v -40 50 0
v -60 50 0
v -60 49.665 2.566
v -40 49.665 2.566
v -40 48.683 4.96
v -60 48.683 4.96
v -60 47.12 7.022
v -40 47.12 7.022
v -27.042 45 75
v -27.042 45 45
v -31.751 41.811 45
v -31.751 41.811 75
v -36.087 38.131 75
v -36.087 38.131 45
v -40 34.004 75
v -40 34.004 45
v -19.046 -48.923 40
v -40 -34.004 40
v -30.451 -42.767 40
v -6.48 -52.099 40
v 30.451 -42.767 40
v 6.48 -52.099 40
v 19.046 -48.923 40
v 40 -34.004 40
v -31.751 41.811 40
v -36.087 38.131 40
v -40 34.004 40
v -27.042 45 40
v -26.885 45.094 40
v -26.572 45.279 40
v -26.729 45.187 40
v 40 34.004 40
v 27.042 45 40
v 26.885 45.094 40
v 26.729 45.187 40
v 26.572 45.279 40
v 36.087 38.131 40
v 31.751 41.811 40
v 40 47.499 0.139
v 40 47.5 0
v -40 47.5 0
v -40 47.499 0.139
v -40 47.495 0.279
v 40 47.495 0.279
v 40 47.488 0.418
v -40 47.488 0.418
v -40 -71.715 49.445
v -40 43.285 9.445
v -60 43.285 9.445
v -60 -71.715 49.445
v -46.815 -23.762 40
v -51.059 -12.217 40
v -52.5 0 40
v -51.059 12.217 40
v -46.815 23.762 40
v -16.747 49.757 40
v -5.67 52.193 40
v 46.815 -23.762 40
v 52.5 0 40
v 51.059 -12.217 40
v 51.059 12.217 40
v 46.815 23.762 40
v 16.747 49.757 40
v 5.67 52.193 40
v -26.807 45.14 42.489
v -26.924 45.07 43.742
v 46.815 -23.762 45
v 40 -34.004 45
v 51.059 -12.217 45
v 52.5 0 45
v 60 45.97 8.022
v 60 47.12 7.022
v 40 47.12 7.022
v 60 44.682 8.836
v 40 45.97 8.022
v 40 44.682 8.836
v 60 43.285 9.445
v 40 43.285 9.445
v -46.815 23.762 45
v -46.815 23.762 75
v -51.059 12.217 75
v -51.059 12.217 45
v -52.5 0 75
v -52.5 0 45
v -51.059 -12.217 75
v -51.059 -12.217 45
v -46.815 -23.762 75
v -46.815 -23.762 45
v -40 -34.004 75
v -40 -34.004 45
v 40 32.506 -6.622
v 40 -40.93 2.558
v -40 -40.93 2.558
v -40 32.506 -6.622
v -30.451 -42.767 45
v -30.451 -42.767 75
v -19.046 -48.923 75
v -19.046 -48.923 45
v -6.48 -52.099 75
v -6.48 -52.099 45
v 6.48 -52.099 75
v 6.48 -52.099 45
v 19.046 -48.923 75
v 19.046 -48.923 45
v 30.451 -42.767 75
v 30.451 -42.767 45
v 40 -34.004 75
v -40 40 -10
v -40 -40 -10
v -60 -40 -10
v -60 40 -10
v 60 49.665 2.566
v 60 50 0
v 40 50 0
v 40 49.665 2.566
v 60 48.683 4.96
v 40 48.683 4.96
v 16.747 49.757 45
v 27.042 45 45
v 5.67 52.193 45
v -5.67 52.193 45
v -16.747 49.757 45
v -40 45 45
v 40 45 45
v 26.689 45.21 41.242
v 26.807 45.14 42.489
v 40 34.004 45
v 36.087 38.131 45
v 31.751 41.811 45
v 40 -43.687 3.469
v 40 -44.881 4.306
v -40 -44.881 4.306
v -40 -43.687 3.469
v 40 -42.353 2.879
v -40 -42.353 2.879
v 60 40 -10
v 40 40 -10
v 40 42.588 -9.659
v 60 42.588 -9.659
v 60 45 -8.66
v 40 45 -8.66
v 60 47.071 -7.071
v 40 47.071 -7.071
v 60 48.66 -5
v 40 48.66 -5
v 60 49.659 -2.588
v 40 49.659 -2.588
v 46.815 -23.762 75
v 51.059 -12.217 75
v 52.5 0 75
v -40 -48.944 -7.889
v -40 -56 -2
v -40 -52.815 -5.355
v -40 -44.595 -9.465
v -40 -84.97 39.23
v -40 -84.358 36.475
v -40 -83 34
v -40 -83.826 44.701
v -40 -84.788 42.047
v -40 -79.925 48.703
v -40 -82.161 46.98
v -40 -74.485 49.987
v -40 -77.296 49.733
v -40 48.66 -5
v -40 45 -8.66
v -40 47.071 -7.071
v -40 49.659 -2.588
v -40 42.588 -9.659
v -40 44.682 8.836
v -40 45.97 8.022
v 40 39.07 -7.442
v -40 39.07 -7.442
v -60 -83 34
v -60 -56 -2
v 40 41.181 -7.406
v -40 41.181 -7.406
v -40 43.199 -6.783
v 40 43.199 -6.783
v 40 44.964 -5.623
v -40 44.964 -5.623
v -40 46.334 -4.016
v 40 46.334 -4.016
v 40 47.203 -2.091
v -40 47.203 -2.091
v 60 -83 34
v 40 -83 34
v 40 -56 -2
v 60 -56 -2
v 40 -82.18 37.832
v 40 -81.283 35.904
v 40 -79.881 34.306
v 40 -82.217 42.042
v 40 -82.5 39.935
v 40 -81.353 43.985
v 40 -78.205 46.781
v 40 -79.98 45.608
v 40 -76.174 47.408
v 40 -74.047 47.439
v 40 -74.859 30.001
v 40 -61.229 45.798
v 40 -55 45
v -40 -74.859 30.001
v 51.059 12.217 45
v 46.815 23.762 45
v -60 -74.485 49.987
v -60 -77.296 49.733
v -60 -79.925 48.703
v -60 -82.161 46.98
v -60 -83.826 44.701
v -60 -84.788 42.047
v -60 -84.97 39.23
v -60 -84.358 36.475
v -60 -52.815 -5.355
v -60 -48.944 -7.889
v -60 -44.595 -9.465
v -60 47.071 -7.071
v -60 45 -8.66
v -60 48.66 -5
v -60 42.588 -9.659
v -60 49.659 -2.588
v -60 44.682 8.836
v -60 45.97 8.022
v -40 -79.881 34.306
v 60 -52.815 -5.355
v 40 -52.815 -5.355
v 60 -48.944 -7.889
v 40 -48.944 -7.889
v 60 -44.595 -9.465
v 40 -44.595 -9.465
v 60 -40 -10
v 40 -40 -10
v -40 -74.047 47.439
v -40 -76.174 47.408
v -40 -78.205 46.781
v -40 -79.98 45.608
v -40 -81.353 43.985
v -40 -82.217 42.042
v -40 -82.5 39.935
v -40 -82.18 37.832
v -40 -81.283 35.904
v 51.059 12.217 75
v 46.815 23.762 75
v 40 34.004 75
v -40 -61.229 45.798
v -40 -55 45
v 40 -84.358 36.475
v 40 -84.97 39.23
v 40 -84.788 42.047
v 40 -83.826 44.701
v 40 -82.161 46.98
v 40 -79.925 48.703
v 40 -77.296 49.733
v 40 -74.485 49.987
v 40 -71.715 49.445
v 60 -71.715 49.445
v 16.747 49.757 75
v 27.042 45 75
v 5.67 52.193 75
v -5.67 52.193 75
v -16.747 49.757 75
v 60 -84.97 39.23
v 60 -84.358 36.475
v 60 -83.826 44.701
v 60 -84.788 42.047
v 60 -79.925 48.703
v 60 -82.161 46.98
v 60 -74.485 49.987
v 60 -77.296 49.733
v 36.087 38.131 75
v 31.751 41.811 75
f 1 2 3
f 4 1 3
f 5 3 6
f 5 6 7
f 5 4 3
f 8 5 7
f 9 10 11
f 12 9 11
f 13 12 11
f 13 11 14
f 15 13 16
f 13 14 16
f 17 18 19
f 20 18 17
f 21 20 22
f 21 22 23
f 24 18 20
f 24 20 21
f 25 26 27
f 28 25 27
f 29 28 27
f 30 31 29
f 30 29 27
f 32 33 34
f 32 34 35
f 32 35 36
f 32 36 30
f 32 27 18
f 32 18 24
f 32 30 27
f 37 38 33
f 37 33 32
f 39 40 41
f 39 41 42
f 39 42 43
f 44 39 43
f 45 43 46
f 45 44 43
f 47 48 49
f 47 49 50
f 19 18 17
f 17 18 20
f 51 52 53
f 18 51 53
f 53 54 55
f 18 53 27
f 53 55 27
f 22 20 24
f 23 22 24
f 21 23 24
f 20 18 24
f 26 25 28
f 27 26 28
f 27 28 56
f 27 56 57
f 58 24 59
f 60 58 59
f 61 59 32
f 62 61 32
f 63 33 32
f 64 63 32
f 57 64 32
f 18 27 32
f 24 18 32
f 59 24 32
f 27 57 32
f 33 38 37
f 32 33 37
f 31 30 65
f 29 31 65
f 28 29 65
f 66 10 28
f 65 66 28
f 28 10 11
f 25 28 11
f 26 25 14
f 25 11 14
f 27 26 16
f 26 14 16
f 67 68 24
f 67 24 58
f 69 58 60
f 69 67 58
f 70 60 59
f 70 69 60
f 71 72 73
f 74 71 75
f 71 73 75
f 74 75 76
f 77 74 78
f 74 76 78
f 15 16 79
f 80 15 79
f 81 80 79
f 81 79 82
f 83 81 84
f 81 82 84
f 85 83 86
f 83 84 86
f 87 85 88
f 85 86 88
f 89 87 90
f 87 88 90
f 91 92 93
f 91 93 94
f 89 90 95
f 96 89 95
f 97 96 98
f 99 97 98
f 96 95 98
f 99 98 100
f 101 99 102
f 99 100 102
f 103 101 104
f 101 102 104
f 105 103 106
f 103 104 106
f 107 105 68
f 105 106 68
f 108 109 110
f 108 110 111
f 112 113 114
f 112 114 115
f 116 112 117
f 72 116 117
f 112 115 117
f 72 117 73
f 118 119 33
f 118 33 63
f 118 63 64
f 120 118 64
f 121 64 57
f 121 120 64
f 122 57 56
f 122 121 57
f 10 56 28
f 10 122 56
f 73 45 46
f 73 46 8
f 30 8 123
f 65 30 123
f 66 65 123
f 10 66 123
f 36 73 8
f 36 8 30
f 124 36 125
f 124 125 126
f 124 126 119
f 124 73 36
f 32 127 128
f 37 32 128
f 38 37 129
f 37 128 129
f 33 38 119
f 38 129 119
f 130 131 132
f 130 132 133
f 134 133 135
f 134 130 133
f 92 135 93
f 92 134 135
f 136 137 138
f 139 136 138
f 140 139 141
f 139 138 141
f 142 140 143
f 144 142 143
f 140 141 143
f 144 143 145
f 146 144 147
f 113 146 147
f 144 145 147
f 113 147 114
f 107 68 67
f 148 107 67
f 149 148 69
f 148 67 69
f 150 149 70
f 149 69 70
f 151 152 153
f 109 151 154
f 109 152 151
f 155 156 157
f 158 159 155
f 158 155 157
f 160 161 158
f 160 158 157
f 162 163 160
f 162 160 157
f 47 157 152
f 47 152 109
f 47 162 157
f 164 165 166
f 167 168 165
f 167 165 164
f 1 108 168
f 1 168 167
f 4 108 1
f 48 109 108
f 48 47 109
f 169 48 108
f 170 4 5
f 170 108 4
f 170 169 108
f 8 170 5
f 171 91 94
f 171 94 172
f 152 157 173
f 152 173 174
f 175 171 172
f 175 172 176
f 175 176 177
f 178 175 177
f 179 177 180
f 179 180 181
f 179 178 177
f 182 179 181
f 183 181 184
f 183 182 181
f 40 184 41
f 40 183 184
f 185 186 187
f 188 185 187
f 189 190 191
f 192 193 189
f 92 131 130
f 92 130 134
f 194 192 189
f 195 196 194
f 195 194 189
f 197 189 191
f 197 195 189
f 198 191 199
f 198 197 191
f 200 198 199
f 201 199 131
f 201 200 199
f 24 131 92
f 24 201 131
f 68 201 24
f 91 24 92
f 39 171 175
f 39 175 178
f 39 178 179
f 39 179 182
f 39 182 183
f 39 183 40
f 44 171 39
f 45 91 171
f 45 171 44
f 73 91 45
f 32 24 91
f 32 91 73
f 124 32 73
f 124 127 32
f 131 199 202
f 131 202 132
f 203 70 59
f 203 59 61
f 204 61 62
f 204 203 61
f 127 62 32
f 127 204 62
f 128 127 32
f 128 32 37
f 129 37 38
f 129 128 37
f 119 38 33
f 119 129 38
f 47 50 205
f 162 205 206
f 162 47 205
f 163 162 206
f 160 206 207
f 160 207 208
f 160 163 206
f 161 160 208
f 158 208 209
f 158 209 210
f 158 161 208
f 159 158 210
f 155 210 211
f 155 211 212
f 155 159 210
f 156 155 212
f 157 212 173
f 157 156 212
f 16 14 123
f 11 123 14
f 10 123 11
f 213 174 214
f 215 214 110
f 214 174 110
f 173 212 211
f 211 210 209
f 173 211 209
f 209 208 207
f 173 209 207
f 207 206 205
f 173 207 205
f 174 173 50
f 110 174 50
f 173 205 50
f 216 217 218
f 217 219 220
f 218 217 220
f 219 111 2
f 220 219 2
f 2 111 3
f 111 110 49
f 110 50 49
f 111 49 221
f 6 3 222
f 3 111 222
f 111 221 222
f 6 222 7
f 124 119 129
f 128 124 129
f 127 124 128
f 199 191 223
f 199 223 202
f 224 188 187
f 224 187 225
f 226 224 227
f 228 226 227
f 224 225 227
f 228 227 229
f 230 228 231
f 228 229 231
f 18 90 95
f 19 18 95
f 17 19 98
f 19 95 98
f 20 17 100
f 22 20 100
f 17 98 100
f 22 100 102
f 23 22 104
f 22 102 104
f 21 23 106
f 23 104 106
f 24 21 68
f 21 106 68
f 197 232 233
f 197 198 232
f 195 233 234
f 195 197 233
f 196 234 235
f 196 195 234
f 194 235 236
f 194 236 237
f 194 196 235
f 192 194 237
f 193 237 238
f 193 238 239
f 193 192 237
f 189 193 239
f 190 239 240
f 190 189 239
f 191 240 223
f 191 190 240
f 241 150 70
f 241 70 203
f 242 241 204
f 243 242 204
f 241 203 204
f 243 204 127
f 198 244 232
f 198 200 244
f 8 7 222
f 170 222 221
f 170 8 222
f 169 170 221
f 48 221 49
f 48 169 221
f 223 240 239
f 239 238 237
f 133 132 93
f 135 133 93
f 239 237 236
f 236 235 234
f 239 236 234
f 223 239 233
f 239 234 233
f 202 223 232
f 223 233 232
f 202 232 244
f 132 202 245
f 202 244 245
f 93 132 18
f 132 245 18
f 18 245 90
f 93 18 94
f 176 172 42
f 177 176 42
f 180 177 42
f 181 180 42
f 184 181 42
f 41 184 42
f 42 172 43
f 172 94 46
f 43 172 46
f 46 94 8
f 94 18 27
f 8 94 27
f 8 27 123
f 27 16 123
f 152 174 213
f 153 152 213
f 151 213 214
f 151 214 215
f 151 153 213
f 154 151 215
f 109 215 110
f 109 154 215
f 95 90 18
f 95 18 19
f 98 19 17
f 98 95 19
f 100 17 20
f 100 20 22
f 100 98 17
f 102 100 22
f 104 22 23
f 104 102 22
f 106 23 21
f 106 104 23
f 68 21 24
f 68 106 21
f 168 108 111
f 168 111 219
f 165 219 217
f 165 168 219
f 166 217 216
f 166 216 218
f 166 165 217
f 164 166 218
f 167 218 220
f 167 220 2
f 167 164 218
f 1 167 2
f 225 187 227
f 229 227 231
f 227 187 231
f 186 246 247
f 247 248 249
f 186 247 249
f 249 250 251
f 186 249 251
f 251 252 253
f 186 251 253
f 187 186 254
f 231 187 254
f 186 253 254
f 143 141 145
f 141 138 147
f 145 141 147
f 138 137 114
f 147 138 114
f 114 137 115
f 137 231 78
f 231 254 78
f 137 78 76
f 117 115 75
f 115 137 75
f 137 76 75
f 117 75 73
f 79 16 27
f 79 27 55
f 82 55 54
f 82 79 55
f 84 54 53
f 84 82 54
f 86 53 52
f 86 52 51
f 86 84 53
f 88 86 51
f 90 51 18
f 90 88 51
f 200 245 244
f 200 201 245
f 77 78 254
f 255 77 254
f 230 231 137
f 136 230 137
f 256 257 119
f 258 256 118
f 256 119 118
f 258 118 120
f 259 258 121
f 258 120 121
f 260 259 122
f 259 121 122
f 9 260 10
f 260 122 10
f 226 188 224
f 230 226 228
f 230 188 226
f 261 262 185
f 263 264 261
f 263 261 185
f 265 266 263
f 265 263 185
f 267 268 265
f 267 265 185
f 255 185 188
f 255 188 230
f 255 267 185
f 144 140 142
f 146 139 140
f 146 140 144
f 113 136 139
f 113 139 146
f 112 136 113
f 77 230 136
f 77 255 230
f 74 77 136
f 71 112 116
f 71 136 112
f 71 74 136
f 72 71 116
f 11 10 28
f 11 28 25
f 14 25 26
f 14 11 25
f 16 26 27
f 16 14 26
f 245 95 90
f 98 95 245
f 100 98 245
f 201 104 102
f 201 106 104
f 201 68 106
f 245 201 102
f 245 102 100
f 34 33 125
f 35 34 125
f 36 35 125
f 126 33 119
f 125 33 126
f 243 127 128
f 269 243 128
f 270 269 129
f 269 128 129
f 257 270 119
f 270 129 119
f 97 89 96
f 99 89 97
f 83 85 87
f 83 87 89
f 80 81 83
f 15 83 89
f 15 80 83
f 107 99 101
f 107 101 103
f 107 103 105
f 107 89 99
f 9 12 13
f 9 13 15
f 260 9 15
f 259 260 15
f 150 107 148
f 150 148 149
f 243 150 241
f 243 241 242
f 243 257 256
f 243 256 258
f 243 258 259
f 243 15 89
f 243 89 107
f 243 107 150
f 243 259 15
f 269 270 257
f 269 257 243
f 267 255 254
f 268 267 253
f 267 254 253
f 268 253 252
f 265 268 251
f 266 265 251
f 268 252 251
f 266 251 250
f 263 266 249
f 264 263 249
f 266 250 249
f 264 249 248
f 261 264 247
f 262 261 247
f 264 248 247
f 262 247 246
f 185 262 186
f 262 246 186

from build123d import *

# Parameters (mm, degrees)
F1_DEPTH      = 40
F2_START      = 40
F2_DEPTH      = 20
F6_DEPTH      = 5
F7_DEPTH      = 30
F7_DEPTH_BACK = 5


with BuildPart() as f1:
    # F0 (on Right) → F1 (new body)
    with BuildSketch(Plane.YZ):
        with BuildLine():
            ThreePointArc((-67.5, 40), (-69.3699394637, 44.9550396928), (-74.047311562, 47.4392462481))
            ThreePointArc((-74.047311562, 47.4392462481), (-81.8542766067, 43.0444855394), (-79.8809353009, 34.3055754823))
            ThreePointArc((-79.8809353009, 34.3055754823), (-71.8660739285, 33.1861532613), (-67.5, 40))
        make_face()
        with BuildLine():
            Line((-22.5329362893, 0.2582503971), (32.5064382574, -6.6216714212))
            ThreePointArc((32.5064382574, -6.6216714212), (31.6956764696, 5.5711947285), (43.2852062494, 9.4449679671))
            Line((43.2852062494, 9.4449679671), (-61.2288449484, 45.7976814272))
            Line((-61.2288449484, 45.7976814272), (-67.4865130573, 46.5990540202))
            ThreePointArc((-67.4865130573, 46.5990540202), (-65.6422526902, 43.5259843004), (-65, 40))
            ThreePointArc((-65, 40), (-67.8792292984, 32.9789869239), (-74.8589249231, 30.0009951584))
            Line((-74.8589249231, 30.0009951584), (-58.9579294654, 16.3715704804))
            ThreePointArc((-58.9579294654, 16.3715704804), (-36.7718882692, 29.7377631624), (-20, 10))
            ThreePointArc((-20, 10), (-20.6435892504, 4.9671714819), (-22.5329362893, 0.2582503971))
        make_face()
        with BuildLine():
            ThreePointArc((-65, 40), (-65.6422526902, 43.5259843004), (-67.4865130573, 46.5990540202))
            Line((-67.4865130573, 46.5990540202), (-74.047311562, 47.4392462481))
            ThreePointArc((-74.047311562, 47.4392462481), (-69.3699394637, 44.9550396928), (-67.5, 40))
            ThreePointArc((-67.5, 40), (-71.8660739285, 33.1861532613), (-79.8809353009, 34.3055754823))
            Line((-79.8809353009, 34.3055754823), (-74.8589249231, 30.0009951584))
            ThreePointArc((-74.8589249231, 30.0009951584), (-67.8792292984, 32.9789869239), (-65, 40))
        make_face()
        with BuildLine():
            Line((-40.9302605094, 2.5579159246), (-22.5329362893, 0.2582503971))
            ThreePointArc((-22.5329362893, 0.2582503971), (-20.6435892504, 4.9671714819), (-20, 10))
            ThreePointArc((-20, 10), (-36.7718882692, 29.7377631624), (-58.9579294654, 16.3715704804))
            Line((-58.9579294654, 16.3715704804), (-44.8809353009, 4.3055754823))
            ThreePointArc((-44.8809353009, 4.3055754823), (-43.1339260715, 16.8138467387), (-32.5, 10))
            ThreePointArc((-32.5, 10), (-35.0364807757, 4.3774136814), (-40.9302605094, 2.5579159246))
        make_face()
        with BuildLine():
            ThreePointArc((-44.8809353009, 4.3055754823), (-43.0341518863, 3.1411427824), (-40.9302605094, 2.5579159246))
            ThreePointArc((-40.9302605094, 2.5579159246), (-35.0364807757, 4.3774136814), (-32.5, 10))
            ThreePointArc((-32.5, 10), (-43.1339260715, 16.8138467387), (-44.8809353009, 4.3055754823))
        make_face()
        with BuildLine():
            ThreePointArc((47.4883448123, 0.4179616875), (34.8816802289, 5.4820436628), (39.0697394906, -7.4420840754))
            ThreePointArc((39.0697394906, -7.4420840754), (44.9635192243, -5.6225863186), (47.5, 0))
            ThreePointArc((47.5, 0), (47.4970856368, 0.2090620815), (47.4883448123, 0.4179616875))
        make_face()
        with BuildLine():
            ThreePointArc((43.2852062494, 9.4449679671), (31.6956764696, 5.5711947285), (32.5064382574, -6.6216714212))
            Line((32.5064382574, -6.6216714212), (39.0697394906, -7.4420840754))
            ThreePointArc((39.0697394906, -7.4420840754), (34.8816802289, 5.4820436628), (47.4883448123, 0.4179616875))
            Line((47.4883448123, 0.4179616875), (47.1197372514, 7.0220610558))
            ThreePointArc((47.1197372514, 7.0220610558), (45.3416600218, 8.4537960829), (43.2852062494, 9.4449679671))
        make_face()
        with BuildLine():
            ThreePointArc((43.2852062494, 9.4449679671), (45.3416600218, 8.4537960829), (47.1197372514, 7.0220610558))
            Line((47.1197372514, 7.0220610558), (45, 45))
            Line((45, 45), (-55, 45))
            Line((-55, 45), (-61.2288449484, 45.7976814272))
            Line((-61.2288449484, 45.7976814272), (43.2852062494, 9.4449679671))
        make_face()
    extrude(amount=F1_DEPTH)

    # F4: F1 across plane


with BuildPart() as f2:
    # F0 (on Right) → F2 (new body)
    with BuildSketch(Plane.YZ.offset(F2_START)):
        with BuildLine():
            ThreePointArc((-71.7147937506, 49.4449679671), (-83.0742850398, 45.8996543201), (-83, 34))
            ThreePointArc((-83, 34), (-79.4089324294, 31.0244044859), (-74.8589249231, 30.0009951584))
            Line((-74.8589249231, 30.0009951584), (-79.8809353009, 34.3055754823))
            ThreePointArc((-79.8809353009, 34.3055754823), (-81.8542766067, 43.0444855394), (-74.047311562, 47.4392462481))
            Line((-74.047311562, 47.4392462481), (-67.4865130573, 46.5990540202))
            ThreePointArc((-67.4865130573, 46.5990540202), (-69.4162960131, 48.2959176579), (-71.7147937506, 49.4449679671))
        make_face()
        with BuildLine():
            Line((-67.4865130573, 46.5990540202), (-61.2288449484, 45.7976814272))
            Line((-61.2288449484, 45.7976814272), (-71.7147937506, 49.4449679671))
            ThreePointArc((-71.7147937506, 49.4449679671), (-69.4162960131, 48.2959176579), (-67.4865130573, 46.5990540202))
        make_face()
        with BuildLine():
            Line((-83, 34), (-56, -2))
            ThreePointArc((-56, -2), (-59.7457048141, 6.8208269322), (-58.9579294654, 16.3715704804))
            Line((-58.9579294654, 16.3715704804), (-74.8589249231, 30.0009951584))
            ThreePointArc((-74.8589249231, 30.0009951584), (-79.4089324294, 31.0244044859), (-83, 34))
        make_face()
        with BuildLine():
            ThreePointArc((-67.5, 40), (-69.3699394637, 44.9550396928), (-74.047311562, 47.4392462481))
            ThreePointArc((-74.047311562, 47.4392462481), (-81.8542766067, 43.0444855394), (-79.8809353009, 34.3055754823))
            ThreePointArc((-79.8809353009, 34.3055754823), (-71.8660739285, 33.1861532613), (-67.5, 40))
        make_face()
        with BuildLine():
            ThreePointArc((-65, 40), (-65.6422526902, 43.5259843004), (-67.4865130573, 46.5990540202))
            Line((-67.4865130573, 46.5990540202), (-74.047311562, 47.4392462481))
            ThreePointArc((-74.047311562, 47.4392462481), (-69.3699394637, 44.9550396928), (-67.5, 40))
            ThreePointArc((-67.5, 40), (-71.8660739285, 33.1861532613), (-79.8809353009, 34.3055754823))
            Line((-79.8809353009, 34.3055754823), (-74.8589249231, 30.0009951584))
            ThreePointArc((-74.8589249231, 30.0009951584), (-67.8792292984, 32.9789869239), (-65, 40))
        make_face()
        with BuildLine():
            Line((-22.5329362893, 0.2582503971), (32.5064382574, -6.6216714212))
            ThreePointArc((32.5064382574, -6.6216714212), (31.6956764696, 5.5711947285), (43.2852062494, 9.4449679671))
            Line((43.2852062494, 9.4449679671), (-61.2288449484, 45.7976814272))
            Line((-61.2288449484, 45.7976814272), (-67.4865130573, 46.5990540202))
            ThreePointArc((-67.4865130573, 46.5990540202), (-65.6422526902, 43.5259843004), (-65, 40))
            ThreePointArc((-65, 40), (-67.8792292984, 32.9789869239), (-74.8589249231, 30.0009951584))
            Line((-74.8589249231, 30.0009951584), (-58.9579294654, 16.3715704804))
            ThreePointArc((-58.9579294654, 16.3715704804), (-36.7718882692, 29.7377631624), (-20, 10))
            ThreePointArc((-20, 10), (-20.6435892504, 4.9671714819), (-22.5329362893, 0.2582503971))
        make_face()
        with BuildLine():
            ThreePointArc((-44.8809353009, 4.3055754823), (-43.0341518863, 3.1411427824), (-40.9302605094, 2.5579159246))
            ThreePointArc((-40.9302605094, 2.5579159246), (-35.0364807757, 4.3774136814), (-32.5, 10))
            ThreePointArc((-32.5, 10), (-43.1339260715, 16.8138467387), (-44.8809353009, 4.3055754823))
        make_face()
        with BuildLine():
            ThreePointArc((-56, -2), (-48.94427191, -7.88854382), (-40, -10))
            ThreePointArc((-40, -10), (-29.8716978732, -7.2457964742), (-22.5329362893, 0.2582503971))
            Line((-22.5329362893, 0.2582503971), (-40.9302605094, 2.5579159246))
            ThreePointArc((-40.9302605094, 2.5579159246), (-43.0341518863, 3.1411427824), (-44.8809353009, 4.3055754823))
            Line((-44.8809353009, 4.3055754823), (-58.9579294654, 16.3715704804))
            ThreePointArc((-58.9579294654, 16.3715704804), (-59.7457048141, 6.8208269322), (-56, -2))
        make_face()
        with BuildLine():
            ThreePointArc((43.2852062494, 9.4449679671), (31.6956764696, 5.5711947285), (32.5064382574, -6.6216714212))
            Line((32.5064382574, -6.6216714212), (39.0697394906, -7.4420840754))
            ThreePointArc((39.0697394906, -7.4420840754), (34.8816802289, 5.4820436628), (47.4883448123, 0.4179616875))
            Line((47.4883448123, 0.4179616875), (47.1197372514, 7.0220610558))
            ThreePointArc((47.1197372514, 7.0220610558), (45.3416600218, 8.4537960829), (43.2852062494, 9.4449679671))
        make_face()
        with BuildLine():
            ThreePointArc((47.4883448123, 0.4179616875), (34.8816802289, 5.4820436628), (39.0697394906, -7.4420840754))
            ThreePointArc((39.0697394906, -7.4420840754), (44.9635192243, -5.6225863186), (47.5, 0))
            ThreePointArc((47.5, 0), (47.4970856368, 0.2090620815), (47.4883448123, 0.4179616875))
        make_face()
        with BuildLine():
            ThreePointArc((32.5064382574, -6.6216714212), (35.8900556094, -9.1163785083), (40, -10))
            ThreePointArc((40, -10), (47.0710678119, -7.0710678119), (50, 0))
            ThreePointArc((50, 0), (49.2519558071, 3.7949062891), (47.1197372514, 7.0220610558))
            Line((47.1197372514, 7.0220610558), (47.4883448123, 0.4179616875))
            ThreePointArc((47.4883448123, 0.4179616875), (47.4970856368, 0.2090620815), (47.5, 0))
            ThreePointArc((47.5, 0), (44.9635192243, -5.6225863186), (39.0697394906, -7.4420840754))
            Line((39.0697394906, -7.4420840754), (32.5064382574, -6.6216714212))
        make_face()
        with BuildLine():
            Line((-40, -10), (40, -10))
            ThreePointArc((40, -10), (35.8900556094, -9.1163785083), (32.5064382574, -6.6216714212))
            Line((32.5064382574, -6.6216714212), (-22.5329362893, 0.2582503971))
            ThreePointArc((-22.5329362893, 0.2582503971), (-29.8716978732, -7.2457964742), (-40, -10))
        make_face()
        with BuildLine():
            Line((-40.9302605094, 2.5579159246), (-22.5329362893, 0.2582503971))
            ThreePointArc((-22.5329362893, 0.2582503971), (-20.6435892504, 4.9671714819), (-20, 10))
            ThreePointArc((-20, 10), (-36.7718882692, 29.7377631624), (-58.9579294654, 16.3715704804))
            Line((-58.9579294654, 16.3715704804), (-44.8809353009, 4.3055754823))
            ThreePointArc((-44.8809353009, 4.3055754823), (-43.1339260715, 16.8138467387), (-32.5, 10))
            ThreePointArc((-32.5, 10), (-35.0364807757, 4.3774136814), (-40.9302605094, 2.5579159246))
        make_face()
    extrude(amount=F2_DEPTH)


with BuildPart() as f3_1:
    # F3: instance of F2
    add(f2.part.mirror(Plane.YZ))


with BuildPart() as f1_1:
    add(f1.part)
    add(f1.part.mirror(Plane.YZ))

    # F5 (on face) → F6 (cut)
    with BuildSketch(Plane.XY.offset(45)):
        with BuildLine():
            Line((40, -34.0036762718), (40, 34.0036762718))
            ThreePointArc((40, 34.0036762718), (33.9687352606, 40.0296768011), (27.041634566, 45))
            Line((27.041634566, 45), (-27.041634566, 45))
            ThreePointArc((-27.041634566, 45), (-33.9687352606, 40.0296768011), (-40, 34.0036762718))
            Line((-40, 34.0036762718), (-40, -34.0036762718))
            ThreePointArc((-40, -34.0036762718), (0, -52.5), (40, -34.0036762718))
        make_face()
        with BuildLine():
            Line((-27.041634566, 45), (27.041634566, 45))
            ThreePointArc((27.041634566, 45), (0, 52.5), (-27.041634566, 45))
        make_face()
    extrude(amount=-F6_DEPTH, mode=Mode.SUBTRACT)


with BuildPart() as f7:
    # F5 (on face) → F7 (new body, two sides)
    with BuildSketch(Plane.XY.offset(45)) as f7_sk:
        with BuildLine():
            ThreePointArc((40, -34.0036762718), (49.2760083611, -18.1142209327), (52.5, 0))
            ThreePointArc((52.5, 0), (49.2760083611, 18.1142209327), (40, 34.0036762718))
            Line((40, 34.0036762718), (40, -34.0036762718))
        make_face()
        with BuildLine():
            Line((40, -34.0036762718), (40, 34.0036762718))
            ThreePointArc((40, 34.0036762718), (33.9687352606, 40.0296768011), (27.041634566, 45))
            Line((27.041634566, 45), (-27.041634566, 45))
            ThreePointArc((-27.041634566, 45), (-33.9687352606, 40.0296768011), (-40, 34.0036762718))
            Line((-40, 34.0036762718), (-40, -34.0036762718))
            ThreePointArc((-40, -34.0036762718), (0, -52.5), (40, -34.0036762718))
        make_face()
        with BuildLine():
            Line((-27.041634566, 45), (27.041634566, 45))
            ThreePointArc((27.041634566, 45), (0, 52.5), (-27.041634566, 45))
        make_face()
        with BuildLine():
            ThreePointArc((-40, 34.0036762718), (-52.5, 0), (-40, -34.0036762718))
            Line((-40, -34.0036762718), (-40, 34.0036762718))
        make_face()
    extrude(amount=F7_DEPTH)
    extrude(f7_sk.sketch, amount=-F7_DEPTH_BACK)


solid = Compound([f2.part, f3_1.part, f1_1.part, f7.part])
